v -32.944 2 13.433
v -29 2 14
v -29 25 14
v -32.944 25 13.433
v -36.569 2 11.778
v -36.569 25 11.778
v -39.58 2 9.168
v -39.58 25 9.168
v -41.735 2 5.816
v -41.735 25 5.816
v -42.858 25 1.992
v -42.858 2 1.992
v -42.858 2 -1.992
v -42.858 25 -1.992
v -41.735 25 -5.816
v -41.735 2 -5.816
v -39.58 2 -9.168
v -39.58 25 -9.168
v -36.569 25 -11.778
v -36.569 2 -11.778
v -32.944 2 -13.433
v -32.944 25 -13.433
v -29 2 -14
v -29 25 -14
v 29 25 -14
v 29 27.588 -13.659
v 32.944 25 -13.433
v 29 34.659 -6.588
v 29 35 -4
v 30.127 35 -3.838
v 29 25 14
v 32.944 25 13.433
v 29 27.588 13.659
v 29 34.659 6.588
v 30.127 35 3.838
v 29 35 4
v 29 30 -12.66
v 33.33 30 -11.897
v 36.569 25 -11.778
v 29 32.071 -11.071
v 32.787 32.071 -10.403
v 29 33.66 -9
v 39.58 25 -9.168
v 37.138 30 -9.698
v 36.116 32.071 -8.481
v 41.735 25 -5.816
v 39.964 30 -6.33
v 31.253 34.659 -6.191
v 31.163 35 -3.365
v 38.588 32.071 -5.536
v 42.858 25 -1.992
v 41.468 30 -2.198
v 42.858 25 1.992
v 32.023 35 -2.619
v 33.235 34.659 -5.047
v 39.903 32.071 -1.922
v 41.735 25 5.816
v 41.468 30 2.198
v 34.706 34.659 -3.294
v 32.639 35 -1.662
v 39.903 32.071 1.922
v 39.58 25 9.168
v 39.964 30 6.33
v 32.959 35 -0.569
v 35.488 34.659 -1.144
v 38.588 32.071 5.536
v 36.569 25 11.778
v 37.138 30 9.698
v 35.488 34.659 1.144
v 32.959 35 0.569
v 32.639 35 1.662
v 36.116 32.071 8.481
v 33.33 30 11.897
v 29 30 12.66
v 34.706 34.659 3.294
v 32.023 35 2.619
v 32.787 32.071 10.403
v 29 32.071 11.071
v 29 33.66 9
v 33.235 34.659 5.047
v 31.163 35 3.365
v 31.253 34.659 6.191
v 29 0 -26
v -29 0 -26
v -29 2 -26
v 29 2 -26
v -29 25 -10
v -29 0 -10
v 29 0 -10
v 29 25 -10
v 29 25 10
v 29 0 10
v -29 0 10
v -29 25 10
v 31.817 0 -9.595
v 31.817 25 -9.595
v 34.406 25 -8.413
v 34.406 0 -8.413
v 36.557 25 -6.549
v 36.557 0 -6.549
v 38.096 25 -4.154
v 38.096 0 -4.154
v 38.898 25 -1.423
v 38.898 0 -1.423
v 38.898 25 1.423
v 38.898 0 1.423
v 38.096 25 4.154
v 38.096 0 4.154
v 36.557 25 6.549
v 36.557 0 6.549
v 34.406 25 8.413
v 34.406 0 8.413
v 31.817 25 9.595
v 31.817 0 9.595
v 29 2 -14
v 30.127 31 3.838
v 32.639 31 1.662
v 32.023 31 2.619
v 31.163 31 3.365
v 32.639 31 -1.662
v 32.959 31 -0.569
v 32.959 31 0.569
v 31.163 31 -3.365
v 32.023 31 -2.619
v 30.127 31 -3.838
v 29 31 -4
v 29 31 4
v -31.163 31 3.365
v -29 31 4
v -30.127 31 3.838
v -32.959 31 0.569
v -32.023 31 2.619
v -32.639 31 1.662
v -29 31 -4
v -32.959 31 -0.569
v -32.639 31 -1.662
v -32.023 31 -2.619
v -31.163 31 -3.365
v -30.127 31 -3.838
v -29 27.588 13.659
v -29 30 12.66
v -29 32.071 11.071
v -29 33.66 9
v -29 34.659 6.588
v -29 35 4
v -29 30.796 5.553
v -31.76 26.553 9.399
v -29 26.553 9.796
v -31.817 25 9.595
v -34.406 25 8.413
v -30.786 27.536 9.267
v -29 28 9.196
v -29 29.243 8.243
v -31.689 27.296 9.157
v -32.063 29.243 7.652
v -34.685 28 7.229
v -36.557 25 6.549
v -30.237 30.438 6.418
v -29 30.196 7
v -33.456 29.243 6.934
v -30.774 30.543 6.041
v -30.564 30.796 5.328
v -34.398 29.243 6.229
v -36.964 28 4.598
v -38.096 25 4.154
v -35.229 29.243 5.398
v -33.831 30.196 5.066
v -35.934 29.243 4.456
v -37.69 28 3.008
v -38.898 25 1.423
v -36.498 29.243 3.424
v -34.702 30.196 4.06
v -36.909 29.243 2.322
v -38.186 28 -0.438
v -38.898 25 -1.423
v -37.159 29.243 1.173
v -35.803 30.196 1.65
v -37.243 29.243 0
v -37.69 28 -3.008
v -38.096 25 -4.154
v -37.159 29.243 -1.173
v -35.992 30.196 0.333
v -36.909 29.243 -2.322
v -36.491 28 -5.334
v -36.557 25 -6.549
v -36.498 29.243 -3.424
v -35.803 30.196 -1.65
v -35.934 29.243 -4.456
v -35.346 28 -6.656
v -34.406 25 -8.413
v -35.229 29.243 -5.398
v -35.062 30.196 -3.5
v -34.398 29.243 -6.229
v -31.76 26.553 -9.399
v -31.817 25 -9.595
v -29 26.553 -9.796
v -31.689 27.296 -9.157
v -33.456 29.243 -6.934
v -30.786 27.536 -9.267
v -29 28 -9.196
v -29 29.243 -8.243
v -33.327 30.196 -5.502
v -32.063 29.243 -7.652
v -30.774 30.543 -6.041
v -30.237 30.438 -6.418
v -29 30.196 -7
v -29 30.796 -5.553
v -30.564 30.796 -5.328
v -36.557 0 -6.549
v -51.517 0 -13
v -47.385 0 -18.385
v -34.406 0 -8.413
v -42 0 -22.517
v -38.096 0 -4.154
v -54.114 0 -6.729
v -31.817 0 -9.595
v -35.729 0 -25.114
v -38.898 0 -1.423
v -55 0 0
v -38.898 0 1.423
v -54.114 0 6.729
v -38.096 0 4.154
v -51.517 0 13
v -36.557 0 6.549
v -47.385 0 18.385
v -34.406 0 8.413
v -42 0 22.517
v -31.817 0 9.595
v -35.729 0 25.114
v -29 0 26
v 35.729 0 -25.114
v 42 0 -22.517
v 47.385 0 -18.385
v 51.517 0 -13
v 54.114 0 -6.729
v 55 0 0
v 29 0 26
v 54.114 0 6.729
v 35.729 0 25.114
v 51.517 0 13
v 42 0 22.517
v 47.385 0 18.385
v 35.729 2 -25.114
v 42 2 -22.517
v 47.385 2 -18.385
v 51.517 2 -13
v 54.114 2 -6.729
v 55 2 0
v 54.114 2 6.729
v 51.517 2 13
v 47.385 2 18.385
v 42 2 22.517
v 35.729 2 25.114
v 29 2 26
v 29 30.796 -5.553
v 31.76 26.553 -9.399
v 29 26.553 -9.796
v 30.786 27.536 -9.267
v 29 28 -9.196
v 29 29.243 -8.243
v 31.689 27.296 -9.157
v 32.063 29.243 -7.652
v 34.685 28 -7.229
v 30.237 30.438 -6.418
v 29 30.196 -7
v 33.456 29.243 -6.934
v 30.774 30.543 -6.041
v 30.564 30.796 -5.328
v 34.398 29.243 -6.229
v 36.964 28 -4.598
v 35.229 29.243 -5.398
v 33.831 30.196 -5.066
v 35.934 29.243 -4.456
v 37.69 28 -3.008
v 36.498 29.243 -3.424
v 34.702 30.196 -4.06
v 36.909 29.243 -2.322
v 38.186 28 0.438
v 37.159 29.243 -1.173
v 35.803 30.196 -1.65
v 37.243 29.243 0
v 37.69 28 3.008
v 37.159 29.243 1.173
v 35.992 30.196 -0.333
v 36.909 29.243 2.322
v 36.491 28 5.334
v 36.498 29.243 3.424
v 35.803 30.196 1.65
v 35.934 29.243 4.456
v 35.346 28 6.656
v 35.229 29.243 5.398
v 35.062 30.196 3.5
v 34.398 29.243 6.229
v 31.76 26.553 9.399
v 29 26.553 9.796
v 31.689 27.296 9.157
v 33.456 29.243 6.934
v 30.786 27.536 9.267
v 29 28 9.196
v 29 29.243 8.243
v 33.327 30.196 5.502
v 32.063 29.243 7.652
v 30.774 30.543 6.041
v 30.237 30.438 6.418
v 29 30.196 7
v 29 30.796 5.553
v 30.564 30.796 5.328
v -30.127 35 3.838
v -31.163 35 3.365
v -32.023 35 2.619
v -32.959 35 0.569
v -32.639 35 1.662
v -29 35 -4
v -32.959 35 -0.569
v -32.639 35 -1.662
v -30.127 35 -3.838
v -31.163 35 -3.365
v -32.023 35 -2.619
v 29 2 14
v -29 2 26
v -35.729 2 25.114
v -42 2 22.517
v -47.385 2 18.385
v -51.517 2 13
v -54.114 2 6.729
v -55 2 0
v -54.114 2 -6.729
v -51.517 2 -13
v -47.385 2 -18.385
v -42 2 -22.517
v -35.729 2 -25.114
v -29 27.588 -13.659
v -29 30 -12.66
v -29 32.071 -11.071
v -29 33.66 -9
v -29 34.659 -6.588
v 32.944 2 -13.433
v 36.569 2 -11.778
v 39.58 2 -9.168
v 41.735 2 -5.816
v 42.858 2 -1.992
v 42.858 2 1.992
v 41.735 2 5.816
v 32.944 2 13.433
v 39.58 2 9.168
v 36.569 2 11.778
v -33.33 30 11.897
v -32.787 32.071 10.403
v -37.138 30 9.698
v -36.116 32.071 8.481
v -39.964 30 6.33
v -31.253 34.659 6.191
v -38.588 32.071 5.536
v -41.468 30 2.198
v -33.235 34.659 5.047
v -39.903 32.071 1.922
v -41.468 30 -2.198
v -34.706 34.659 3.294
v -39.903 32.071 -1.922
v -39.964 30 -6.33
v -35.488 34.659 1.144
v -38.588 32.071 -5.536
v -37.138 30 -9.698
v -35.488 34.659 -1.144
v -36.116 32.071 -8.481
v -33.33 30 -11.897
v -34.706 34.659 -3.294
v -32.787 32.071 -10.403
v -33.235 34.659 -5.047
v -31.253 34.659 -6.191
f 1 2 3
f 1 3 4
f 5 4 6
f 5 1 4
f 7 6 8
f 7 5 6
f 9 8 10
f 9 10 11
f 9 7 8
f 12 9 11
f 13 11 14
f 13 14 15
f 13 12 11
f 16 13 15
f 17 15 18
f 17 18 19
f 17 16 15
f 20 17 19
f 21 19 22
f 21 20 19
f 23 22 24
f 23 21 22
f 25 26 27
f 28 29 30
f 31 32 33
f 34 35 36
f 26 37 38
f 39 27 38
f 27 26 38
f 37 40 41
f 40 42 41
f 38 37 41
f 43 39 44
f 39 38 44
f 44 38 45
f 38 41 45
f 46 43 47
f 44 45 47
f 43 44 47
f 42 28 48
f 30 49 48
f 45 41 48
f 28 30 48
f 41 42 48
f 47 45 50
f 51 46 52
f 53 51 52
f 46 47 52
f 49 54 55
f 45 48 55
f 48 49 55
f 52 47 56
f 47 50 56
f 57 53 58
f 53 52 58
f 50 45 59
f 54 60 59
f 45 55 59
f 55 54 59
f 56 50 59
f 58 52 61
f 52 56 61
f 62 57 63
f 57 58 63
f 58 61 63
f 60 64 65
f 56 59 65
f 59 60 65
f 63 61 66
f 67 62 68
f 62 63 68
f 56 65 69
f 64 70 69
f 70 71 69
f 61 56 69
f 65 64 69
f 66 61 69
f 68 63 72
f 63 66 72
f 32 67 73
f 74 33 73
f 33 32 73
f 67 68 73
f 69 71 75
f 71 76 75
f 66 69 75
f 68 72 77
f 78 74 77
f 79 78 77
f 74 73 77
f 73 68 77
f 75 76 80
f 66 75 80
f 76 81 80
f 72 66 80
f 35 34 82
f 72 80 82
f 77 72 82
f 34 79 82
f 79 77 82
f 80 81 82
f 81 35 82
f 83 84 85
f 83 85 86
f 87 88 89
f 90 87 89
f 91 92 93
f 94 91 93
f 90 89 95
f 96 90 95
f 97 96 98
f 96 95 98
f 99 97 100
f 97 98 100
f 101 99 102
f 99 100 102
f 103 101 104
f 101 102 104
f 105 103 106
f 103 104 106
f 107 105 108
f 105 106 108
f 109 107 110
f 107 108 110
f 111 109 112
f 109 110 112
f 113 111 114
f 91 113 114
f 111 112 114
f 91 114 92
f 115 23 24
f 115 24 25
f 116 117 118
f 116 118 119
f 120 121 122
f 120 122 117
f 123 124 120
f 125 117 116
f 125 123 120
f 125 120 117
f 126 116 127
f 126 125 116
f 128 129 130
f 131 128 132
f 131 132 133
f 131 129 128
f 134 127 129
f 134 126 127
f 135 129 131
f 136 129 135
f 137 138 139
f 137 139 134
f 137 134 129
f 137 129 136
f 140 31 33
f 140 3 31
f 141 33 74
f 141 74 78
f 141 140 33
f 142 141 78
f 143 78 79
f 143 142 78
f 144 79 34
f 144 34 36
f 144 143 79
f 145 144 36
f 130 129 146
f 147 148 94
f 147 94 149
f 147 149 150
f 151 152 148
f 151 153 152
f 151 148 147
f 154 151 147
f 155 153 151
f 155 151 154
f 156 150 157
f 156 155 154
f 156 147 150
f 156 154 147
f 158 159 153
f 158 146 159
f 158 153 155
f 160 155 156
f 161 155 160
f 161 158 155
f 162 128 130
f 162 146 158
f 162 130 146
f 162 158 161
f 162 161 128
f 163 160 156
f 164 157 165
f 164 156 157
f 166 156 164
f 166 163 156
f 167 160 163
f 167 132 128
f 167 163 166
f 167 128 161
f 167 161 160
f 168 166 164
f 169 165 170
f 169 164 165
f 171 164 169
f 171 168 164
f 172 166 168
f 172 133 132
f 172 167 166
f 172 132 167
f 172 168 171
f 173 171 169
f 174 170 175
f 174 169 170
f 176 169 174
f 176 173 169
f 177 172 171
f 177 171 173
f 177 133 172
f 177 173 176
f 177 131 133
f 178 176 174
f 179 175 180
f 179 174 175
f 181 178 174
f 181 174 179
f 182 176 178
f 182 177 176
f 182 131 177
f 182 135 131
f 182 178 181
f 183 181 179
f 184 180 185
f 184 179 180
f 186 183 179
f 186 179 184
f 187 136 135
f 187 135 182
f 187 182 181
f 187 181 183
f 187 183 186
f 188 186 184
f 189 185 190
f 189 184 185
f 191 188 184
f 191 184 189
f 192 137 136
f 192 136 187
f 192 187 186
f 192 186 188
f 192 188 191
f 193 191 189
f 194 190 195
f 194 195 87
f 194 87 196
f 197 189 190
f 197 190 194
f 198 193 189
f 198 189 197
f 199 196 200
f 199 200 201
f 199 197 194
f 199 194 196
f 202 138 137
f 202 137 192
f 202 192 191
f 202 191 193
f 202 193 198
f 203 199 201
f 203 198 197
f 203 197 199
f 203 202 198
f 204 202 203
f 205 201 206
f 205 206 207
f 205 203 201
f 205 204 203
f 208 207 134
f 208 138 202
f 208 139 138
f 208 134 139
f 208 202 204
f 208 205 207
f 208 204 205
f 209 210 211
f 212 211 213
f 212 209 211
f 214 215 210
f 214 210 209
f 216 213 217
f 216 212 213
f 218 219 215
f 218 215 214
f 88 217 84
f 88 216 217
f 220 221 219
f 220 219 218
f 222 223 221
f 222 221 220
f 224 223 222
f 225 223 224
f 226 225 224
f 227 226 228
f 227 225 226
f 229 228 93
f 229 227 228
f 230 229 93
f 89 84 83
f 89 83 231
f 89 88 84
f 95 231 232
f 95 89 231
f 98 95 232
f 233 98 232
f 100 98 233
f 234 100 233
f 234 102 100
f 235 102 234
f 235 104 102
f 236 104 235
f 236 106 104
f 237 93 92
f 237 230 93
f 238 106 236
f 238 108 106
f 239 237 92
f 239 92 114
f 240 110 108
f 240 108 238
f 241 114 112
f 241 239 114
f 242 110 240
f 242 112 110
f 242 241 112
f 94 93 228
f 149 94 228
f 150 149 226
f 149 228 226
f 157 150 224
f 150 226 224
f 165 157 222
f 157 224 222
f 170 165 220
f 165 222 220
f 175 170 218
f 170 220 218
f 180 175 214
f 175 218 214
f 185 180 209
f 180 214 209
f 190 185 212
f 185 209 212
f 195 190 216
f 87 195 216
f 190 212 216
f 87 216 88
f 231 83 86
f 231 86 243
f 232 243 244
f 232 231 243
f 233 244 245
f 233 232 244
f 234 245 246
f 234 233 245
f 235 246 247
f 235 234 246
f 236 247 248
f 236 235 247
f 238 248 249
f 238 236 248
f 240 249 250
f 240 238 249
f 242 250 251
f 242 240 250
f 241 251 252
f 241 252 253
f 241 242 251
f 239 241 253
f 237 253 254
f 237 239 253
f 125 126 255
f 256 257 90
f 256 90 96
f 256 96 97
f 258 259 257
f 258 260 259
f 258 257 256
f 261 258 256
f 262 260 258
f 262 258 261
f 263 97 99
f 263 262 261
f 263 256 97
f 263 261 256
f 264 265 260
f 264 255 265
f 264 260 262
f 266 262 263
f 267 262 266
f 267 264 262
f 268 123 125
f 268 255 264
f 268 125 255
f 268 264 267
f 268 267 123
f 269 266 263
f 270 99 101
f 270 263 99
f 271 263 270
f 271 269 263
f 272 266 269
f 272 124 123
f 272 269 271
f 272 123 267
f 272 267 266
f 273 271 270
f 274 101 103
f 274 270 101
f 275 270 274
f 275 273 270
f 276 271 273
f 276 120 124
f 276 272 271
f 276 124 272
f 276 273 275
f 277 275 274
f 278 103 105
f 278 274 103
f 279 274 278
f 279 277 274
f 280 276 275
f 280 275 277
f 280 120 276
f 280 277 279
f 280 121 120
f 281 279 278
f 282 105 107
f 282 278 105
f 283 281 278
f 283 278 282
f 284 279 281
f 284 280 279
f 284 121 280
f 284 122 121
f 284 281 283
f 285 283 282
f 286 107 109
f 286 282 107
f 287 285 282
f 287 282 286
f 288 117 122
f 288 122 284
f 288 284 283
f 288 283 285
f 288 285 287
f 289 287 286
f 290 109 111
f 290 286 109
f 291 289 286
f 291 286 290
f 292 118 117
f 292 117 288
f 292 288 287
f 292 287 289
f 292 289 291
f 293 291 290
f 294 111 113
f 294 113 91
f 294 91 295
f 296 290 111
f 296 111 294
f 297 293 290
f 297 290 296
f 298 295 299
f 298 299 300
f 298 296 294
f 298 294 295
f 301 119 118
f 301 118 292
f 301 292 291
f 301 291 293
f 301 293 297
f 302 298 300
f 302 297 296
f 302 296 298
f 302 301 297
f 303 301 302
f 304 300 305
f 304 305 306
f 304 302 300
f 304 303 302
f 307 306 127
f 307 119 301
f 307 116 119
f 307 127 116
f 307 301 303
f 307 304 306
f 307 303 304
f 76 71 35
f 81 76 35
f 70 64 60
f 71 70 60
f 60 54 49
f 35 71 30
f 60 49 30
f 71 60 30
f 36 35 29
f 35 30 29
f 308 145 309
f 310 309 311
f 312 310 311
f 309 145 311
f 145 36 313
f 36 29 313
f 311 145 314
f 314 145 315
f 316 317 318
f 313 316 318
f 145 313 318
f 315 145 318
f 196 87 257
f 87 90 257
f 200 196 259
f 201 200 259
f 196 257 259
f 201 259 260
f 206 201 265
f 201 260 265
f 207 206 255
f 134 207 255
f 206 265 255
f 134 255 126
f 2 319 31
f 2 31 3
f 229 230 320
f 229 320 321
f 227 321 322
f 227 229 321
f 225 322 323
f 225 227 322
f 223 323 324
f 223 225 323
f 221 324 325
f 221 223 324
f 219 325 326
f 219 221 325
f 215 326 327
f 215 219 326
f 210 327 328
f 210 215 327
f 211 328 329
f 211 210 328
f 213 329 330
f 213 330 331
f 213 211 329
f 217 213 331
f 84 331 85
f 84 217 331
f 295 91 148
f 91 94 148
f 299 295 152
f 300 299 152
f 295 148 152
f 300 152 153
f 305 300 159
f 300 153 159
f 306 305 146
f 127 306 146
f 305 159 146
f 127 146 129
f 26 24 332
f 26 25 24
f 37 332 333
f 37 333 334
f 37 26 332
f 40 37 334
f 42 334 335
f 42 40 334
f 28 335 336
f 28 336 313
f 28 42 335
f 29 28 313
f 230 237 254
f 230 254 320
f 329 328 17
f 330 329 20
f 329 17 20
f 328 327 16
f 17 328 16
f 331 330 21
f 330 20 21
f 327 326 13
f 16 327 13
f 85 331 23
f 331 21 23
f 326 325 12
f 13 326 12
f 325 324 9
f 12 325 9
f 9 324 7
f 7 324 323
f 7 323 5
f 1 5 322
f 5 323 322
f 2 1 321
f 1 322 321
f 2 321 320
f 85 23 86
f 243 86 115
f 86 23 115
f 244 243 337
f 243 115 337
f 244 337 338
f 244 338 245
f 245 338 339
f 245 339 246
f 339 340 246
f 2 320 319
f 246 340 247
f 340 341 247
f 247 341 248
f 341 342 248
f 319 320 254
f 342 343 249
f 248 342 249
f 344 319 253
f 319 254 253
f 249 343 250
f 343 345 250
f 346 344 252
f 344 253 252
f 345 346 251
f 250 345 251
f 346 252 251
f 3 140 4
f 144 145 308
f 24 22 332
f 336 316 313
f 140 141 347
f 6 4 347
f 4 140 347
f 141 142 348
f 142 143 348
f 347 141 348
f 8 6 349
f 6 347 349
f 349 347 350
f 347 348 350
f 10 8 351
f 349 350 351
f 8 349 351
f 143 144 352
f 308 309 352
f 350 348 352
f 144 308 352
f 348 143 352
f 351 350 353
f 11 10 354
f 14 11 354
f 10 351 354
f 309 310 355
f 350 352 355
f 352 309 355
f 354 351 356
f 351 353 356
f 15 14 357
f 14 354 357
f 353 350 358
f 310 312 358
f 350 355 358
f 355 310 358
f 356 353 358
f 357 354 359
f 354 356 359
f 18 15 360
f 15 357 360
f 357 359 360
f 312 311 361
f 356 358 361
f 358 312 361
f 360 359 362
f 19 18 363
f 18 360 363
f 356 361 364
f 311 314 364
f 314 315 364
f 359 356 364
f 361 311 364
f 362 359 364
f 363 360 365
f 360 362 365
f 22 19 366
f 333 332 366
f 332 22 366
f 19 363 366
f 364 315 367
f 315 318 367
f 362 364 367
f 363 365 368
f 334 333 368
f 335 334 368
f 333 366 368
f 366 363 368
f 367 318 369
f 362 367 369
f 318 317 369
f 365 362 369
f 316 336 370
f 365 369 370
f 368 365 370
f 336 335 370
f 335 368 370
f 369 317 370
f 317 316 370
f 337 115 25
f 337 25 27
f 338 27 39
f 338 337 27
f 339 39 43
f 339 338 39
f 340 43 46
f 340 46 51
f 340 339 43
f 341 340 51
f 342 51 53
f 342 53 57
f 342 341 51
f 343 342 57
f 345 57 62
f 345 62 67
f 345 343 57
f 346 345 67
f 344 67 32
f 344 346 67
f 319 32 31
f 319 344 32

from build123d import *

# Parameters (mm, degrees)
BOSS_EXTRUDE1_DEPTH = 35
FILLET1_R           = 10
SHELL1_T            = -4
BOSS_EXTRUDE2_DEPTH = 2


with BuildPart() as part:
    # Sketch2 → Boss-Extrude1 (new body)
    with BuildSketch(Plane(origin=(0, 0, 0), x_dir=(1, 0, 0), z_dir=(0, 1, 0))):
        with BuildLine():
            Line((-29, 14), (29, 14))
            ThreePointArc((29, 14), (43, 0), (29, -14))
            Line((29, -14), (-29, -14))
            ThreePointArc((-29, -14), (-43, 0), (-29, 14))
        make_face()
    extrude(amount=BOSS_EXTRUDE1_DEPTH)

    # Fillet1
    fillet1_edges = [part.edges().sort_by_distance(p)[0] for p in [
        (43, 35, 0),
        (0, 35, -14),
        (-43, 35, 0),
        (0, 35, 14),
    ]]
    fillet(fillet1_edges, radius=FILLET1_R)

    # Shell1
    shell1_openings = [part.faces().sort_by_distance(p)[0] for p in [
        (0, 0, 0),
    ]]
    offset(amount=SHELL1_T, openings=shell1_openings, kind=Kind.INTERSECTION)

    # Sketch3 → Boss-Extrude2 (add)
    with BuildSketch(Plane.XZ):
        with BuildLine():
            Line((-29, -26), (29, -26))
            ThreePointArc((29, -26), (55, 0), (29, 26))
            Line((29, 26), (-29, 26))
            ThreePointArc((-29, 26), (-55, 0), (-29, -26))
        make_face()
        with BuildLine():
            Line((-29, -10), (29, -10))
            ThreePointArc((29, -10), (39, 0), (29, 10))
            Line((29, 10), (-29, 10))
            ThreePointArc((-29, 10), (-39, 0), (-29, -10))
        make_face(mode=Mode.SUBTRACT)
    extrude(amount=-BOSS_EXTRUDE2_DEPTH)


solid = part.part
